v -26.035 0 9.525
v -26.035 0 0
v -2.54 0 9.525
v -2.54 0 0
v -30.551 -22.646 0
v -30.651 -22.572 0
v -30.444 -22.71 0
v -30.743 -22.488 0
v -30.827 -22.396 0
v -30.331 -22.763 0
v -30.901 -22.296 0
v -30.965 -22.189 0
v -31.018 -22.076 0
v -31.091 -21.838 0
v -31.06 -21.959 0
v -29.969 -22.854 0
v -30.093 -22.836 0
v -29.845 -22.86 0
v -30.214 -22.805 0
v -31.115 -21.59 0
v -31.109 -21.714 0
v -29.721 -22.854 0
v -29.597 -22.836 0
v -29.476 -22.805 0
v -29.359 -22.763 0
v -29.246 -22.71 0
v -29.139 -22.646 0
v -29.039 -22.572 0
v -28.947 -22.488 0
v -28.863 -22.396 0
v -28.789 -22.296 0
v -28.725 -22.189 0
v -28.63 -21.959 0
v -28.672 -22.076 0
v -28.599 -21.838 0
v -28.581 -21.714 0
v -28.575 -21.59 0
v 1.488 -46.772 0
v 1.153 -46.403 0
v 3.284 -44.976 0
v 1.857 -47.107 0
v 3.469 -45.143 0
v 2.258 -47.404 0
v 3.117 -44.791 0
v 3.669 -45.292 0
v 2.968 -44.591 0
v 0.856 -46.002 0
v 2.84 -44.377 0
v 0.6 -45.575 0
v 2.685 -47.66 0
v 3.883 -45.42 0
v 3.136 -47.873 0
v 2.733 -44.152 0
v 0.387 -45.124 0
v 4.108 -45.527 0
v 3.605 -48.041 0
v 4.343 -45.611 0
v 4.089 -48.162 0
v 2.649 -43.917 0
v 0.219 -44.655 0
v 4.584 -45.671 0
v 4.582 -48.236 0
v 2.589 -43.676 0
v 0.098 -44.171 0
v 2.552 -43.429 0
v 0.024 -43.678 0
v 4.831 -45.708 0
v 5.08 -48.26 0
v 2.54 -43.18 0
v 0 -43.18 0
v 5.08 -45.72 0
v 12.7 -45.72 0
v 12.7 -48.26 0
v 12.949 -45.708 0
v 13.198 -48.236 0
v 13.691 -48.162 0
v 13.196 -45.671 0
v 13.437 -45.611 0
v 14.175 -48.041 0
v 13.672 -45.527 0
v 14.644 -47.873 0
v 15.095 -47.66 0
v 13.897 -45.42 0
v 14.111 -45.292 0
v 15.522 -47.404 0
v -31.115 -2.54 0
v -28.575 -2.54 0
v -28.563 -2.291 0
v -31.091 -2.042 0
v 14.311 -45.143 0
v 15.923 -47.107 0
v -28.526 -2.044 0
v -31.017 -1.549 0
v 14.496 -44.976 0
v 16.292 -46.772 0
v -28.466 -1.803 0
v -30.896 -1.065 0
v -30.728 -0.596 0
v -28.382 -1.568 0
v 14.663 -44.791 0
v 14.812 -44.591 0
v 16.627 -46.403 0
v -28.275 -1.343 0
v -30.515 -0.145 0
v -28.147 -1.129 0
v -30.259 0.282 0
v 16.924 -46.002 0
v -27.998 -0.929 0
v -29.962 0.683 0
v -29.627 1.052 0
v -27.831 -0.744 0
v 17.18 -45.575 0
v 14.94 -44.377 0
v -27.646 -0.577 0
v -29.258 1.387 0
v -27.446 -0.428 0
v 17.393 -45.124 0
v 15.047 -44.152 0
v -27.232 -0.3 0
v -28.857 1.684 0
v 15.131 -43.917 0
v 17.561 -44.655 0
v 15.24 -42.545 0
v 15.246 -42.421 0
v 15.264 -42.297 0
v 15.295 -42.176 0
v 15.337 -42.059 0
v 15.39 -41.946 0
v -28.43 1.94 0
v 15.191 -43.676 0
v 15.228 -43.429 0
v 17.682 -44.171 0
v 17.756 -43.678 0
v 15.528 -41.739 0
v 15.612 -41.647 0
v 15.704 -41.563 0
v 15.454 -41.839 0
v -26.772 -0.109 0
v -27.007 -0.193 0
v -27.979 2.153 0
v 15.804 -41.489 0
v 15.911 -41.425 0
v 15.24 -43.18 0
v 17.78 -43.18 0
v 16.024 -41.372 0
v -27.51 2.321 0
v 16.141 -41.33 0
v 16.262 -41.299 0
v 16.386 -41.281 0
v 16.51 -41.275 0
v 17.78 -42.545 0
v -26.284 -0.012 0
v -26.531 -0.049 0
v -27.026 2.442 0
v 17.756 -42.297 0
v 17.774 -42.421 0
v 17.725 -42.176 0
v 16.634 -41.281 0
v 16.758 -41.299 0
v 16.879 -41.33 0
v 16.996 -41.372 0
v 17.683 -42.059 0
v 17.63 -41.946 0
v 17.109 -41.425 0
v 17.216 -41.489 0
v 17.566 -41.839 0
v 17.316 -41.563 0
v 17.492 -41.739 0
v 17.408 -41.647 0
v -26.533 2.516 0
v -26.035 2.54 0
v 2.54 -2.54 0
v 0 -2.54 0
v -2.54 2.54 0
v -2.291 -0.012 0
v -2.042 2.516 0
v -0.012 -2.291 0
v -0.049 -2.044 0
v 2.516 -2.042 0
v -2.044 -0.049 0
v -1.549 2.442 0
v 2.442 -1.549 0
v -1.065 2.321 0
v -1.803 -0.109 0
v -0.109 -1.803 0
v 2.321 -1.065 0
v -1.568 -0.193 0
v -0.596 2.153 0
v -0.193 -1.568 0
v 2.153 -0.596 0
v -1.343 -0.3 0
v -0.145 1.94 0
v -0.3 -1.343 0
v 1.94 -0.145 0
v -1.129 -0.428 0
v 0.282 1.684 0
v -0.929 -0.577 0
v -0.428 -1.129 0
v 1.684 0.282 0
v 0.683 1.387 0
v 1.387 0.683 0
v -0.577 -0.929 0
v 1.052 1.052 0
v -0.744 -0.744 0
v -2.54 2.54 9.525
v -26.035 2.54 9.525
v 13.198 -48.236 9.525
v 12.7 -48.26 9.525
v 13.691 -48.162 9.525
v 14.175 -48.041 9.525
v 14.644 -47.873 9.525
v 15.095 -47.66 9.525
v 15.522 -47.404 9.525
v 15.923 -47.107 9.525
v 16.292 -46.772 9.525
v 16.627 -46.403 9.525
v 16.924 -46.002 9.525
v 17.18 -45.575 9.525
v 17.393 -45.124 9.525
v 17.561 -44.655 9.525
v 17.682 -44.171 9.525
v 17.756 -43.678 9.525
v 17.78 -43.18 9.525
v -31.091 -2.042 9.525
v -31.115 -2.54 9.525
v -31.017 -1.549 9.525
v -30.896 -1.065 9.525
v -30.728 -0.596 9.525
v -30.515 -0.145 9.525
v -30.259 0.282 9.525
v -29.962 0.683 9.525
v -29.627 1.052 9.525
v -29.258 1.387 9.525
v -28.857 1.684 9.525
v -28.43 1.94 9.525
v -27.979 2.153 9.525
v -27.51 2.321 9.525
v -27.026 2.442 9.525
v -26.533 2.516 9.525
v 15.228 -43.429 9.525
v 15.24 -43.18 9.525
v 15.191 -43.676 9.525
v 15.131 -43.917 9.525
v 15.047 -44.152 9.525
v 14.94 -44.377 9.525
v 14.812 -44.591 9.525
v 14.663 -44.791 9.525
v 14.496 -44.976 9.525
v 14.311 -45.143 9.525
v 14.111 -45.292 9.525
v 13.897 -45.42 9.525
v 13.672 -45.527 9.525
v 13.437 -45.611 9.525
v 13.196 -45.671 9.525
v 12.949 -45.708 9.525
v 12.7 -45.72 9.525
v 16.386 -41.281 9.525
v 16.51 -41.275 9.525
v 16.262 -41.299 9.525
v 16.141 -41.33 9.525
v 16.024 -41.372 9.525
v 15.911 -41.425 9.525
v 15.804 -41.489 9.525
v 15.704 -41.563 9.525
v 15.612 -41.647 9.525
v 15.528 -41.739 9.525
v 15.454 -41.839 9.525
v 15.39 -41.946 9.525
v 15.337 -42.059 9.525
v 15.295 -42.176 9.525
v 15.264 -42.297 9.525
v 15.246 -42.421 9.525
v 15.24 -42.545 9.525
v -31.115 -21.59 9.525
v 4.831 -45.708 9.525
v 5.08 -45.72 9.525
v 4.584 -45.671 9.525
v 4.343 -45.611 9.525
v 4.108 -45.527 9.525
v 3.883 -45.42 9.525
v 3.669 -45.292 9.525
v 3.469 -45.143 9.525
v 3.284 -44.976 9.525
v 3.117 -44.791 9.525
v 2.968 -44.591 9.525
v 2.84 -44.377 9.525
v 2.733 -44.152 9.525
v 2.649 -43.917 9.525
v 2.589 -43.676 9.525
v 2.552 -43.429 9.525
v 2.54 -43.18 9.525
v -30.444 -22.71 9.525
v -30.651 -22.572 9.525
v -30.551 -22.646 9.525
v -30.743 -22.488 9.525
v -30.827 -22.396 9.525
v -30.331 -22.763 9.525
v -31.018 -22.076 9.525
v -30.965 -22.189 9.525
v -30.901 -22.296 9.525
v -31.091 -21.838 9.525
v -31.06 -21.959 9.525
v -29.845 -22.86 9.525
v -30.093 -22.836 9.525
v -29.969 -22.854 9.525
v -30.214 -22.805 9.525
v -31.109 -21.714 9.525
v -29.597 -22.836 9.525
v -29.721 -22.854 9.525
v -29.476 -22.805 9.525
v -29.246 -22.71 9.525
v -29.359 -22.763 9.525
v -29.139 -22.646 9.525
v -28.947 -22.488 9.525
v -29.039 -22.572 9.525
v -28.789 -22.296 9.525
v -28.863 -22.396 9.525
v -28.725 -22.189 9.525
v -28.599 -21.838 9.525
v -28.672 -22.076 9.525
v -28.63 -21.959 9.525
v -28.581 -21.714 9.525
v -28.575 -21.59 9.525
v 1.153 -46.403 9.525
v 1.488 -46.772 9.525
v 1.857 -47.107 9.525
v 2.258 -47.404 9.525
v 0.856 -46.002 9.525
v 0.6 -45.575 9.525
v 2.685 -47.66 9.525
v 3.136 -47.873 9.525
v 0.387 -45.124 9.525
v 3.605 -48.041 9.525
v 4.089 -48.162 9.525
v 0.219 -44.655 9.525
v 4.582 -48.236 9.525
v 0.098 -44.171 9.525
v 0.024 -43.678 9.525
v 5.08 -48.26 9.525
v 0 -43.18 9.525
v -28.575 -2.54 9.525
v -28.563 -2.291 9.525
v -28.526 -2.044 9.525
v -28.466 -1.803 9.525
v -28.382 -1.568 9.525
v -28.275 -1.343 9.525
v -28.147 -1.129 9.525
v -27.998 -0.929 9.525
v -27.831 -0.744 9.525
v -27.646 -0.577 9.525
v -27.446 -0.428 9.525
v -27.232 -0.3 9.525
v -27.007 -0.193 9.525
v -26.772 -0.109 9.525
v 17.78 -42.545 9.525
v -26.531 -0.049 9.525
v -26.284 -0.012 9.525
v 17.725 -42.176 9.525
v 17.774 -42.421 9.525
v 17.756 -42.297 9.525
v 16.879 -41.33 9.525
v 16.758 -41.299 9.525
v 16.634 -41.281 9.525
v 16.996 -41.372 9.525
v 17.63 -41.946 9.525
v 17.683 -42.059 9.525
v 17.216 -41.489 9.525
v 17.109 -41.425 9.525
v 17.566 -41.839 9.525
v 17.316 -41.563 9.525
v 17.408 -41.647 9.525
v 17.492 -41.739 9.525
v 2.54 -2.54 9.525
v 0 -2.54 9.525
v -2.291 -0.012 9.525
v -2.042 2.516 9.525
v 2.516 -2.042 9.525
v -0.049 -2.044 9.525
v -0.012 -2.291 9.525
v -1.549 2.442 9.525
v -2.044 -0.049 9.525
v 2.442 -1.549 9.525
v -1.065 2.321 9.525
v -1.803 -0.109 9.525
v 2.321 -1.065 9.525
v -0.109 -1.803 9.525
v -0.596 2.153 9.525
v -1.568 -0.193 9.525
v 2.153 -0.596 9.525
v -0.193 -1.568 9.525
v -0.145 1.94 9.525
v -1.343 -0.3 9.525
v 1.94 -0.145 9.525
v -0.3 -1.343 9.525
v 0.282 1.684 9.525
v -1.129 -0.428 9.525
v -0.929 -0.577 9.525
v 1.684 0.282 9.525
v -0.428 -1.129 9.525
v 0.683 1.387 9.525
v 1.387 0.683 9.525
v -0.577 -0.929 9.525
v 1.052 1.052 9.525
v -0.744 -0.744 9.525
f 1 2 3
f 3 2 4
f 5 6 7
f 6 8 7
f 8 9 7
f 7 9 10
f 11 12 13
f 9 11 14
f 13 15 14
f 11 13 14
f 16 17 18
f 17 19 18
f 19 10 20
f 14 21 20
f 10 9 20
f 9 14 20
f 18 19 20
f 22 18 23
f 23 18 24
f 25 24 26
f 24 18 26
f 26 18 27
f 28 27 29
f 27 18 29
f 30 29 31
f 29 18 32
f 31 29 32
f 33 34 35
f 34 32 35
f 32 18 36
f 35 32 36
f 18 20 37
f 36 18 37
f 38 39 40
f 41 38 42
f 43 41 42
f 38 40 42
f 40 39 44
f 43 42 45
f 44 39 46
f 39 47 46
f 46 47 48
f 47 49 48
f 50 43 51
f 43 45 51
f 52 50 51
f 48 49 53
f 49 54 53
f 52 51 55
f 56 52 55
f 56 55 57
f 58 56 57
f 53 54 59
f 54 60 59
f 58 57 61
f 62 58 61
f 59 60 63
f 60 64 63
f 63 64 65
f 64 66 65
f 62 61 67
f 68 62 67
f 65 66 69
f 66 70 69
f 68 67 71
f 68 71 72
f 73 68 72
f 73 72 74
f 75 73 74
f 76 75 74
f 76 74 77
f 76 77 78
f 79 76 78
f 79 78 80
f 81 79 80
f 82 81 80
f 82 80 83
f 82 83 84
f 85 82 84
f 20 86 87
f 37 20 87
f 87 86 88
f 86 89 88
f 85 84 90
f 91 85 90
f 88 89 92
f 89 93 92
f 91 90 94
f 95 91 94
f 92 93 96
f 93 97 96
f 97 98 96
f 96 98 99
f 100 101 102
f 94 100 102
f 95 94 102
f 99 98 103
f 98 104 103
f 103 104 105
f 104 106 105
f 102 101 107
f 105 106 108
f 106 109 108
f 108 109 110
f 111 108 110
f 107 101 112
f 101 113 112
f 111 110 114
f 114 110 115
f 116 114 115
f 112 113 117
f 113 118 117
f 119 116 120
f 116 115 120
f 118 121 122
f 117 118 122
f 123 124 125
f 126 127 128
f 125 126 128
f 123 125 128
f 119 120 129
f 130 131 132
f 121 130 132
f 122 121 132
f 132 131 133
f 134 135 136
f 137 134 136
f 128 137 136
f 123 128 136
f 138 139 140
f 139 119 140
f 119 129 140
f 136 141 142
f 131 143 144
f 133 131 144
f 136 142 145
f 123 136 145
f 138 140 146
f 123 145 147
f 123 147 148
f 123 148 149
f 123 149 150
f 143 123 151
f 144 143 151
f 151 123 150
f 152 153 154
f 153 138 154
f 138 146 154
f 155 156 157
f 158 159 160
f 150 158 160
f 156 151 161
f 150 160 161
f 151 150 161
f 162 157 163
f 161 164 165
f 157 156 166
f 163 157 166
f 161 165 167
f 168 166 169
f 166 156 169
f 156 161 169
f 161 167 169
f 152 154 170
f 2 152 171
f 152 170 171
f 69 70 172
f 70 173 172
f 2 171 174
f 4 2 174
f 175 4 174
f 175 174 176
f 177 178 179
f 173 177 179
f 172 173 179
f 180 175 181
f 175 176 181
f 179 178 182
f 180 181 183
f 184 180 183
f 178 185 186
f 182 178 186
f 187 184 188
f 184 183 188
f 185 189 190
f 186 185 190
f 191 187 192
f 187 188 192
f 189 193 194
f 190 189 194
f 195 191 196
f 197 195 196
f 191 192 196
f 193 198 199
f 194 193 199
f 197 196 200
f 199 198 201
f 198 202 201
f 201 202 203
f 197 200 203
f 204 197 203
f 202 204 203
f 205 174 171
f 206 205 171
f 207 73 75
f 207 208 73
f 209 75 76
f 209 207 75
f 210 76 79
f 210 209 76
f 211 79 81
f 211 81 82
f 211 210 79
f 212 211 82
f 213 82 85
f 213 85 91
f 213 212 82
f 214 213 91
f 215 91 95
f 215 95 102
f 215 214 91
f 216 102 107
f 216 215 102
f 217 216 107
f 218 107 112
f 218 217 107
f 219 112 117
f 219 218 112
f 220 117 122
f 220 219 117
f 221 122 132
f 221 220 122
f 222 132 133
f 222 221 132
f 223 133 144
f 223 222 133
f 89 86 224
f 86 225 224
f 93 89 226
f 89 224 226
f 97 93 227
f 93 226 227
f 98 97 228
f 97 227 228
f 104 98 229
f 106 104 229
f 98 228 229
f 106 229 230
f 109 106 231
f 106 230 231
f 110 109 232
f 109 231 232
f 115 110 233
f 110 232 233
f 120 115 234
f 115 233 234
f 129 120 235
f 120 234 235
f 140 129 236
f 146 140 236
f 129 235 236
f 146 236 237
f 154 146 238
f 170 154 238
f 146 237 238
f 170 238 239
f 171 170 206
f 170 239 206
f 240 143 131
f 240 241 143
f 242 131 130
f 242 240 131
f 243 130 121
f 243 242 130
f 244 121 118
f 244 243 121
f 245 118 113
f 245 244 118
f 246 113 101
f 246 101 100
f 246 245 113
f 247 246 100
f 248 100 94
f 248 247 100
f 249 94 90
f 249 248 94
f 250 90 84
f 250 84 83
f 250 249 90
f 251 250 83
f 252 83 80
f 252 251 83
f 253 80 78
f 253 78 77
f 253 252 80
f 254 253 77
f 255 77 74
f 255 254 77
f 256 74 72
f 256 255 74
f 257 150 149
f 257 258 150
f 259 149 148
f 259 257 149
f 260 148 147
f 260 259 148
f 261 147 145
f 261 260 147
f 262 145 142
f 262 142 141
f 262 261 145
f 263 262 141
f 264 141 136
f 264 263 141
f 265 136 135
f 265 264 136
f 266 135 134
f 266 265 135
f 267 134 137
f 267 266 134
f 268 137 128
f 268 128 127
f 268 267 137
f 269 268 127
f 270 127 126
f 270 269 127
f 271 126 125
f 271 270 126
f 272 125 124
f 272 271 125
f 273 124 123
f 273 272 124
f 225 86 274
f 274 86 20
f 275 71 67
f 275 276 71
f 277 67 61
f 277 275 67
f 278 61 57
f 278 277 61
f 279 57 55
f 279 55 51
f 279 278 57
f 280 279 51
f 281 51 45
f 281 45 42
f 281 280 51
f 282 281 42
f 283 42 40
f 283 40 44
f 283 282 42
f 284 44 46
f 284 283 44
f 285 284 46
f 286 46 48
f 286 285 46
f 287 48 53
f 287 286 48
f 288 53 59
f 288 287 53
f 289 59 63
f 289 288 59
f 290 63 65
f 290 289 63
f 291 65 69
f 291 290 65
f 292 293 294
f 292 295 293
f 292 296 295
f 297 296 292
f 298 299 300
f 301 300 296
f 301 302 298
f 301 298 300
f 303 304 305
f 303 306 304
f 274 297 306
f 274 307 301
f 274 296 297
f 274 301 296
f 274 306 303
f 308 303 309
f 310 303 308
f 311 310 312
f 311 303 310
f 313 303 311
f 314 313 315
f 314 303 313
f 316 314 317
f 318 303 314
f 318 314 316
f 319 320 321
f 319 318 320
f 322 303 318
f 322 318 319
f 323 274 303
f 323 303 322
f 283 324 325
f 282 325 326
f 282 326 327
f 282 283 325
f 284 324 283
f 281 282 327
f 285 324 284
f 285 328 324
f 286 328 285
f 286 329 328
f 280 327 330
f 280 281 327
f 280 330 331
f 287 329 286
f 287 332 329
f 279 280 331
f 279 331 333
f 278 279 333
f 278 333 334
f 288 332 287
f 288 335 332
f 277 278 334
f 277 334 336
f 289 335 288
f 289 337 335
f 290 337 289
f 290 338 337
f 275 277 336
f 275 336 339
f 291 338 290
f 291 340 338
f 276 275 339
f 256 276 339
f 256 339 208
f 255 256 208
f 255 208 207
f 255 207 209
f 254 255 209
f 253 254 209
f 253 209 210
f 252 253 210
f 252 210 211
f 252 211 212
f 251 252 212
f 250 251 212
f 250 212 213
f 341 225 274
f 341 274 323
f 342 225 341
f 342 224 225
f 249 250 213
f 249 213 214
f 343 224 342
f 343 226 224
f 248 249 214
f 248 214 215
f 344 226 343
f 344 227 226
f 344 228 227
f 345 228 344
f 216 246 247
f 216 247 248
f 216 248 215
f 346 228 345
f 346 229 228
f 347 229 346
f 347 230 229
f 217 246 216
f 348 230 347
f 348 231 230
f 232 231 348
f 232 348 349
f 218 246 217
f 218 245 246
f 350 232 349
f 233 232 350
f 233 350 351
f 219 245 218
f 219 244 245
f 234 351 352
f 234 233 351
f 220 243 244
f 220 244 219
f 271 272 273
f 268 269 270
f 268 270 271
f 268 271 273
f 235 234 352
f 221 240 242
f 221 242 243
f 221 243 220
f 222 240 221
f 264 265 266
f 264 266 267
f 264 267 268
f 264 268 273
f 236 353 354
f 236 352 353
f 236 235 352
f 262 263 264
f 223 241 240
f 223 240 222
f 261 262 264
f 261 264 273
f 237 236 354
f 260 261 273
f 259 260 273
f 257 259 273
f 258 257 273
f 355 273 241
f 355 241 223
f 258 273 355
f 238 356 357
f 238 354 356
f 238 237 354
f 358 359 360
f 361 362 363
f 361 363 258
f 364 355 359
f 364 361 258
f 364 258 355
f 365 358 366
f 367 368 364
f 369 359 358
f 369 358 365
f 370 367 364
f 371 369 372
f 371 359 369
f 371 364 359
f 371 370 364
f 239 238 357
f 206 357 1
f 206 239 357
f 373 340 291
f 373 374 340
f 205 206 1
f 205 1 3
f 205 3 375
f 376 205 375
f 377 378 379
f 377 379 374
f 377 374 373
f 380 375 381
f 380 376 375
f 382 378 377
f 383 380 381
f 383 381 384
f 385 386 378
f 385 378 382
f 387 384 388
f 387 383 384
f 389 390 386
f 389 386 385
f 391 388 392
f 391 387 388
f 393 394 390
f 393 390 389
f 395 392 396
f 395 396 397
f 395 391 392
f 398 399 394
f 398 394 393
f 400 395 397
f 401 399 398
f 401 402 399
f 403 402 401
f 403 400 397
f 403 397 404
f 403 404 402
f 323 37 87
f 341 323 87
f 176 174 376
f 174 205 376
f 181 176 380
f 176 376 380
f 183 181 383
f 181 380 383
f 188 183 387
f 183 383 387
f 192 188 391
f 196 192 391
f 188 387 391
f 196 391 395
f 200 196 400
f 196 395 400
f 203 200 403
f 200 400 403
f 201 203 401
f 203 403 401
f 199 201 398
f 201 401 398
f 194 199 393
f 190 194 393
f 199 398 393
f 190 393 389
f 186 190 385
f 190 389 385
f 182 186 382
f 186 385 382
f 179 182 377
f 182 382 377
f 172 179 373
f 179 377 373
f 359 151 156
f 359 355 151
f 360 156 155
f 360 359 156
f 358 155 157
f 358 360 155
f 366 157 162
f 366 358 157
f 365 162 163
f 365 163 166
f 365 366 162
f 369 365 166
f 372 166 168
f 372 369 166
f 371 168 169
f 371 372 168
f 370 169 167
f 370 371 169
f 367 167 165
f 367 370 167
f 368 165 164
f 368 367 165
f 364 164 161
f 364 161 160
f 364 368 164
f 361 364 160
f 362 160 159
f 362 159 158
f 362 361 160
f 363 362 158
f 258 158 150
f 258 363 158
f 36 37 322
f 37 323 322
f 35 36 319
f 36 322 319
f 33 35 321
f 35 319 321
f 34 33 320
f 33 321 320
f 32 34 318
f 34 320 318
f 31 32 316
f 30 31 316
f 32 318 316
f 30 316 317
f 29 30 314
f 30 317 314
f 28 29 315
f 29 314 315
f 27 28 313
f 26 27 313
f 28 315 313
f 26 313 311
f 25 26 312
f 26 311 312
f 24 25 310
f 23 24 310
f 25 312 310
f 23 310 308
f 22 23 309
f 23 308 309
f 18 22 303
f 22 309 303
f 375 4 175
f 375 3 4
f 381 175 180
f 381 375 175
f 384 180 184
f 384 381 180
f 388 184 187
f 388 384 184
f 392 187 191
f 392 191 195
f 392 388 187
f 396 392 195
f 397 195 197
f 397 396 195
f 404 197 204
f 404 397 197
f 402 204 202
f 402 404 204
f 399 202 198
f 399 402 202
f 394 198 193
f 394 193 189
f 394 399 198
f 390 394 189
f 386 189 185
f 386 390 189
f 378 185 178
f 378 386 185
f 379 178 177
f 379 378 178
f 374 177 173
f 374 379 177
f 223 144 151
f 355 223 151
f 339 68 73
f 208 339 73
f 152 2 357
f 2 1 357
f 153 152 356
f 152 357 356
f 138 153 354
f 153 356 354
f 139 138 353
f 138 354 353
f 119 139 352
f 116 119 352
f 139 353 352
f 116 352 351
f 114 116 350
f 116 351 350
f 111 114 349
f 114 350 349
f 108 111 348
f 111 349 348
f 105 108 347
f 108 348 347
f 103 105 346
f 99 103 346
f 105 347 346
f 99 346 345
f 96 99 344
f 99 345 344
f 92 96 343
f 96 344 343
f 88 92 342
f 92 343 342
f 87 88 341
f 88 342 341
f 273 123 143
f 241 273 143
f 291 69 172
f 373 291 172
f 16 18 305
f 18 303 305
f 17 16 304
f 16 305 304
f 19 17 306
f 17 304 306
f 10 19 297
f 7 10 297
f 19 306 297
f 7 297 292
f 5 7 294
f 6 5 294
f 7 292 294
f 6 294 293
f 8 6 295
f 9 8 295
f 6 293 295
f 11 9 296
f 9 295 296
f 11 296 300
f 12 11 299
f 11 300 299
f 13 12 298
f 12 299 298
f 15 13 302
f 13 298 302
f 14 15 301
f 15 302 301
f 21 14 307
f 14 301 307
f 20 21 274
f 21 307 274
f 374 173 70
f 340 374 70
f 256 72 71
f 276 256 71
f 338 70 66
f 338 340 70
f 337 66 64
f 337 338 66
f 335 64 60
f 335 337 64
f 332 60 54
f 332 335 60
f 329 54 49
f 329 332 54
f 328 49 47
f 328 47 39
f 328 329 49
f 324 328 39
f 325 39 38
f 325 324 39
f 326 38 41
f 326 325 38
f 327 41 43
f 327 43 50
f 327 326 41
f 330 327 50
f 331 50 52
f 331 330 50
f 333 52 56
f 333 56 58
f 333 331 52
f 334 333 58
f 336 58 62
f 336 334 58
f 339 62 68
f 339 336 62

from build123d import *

# Parameters (mm, degrees)
F1_DEPTH = 9.525
F2_R     = 2.54
F3_R     = 5.08
F4_R     = 1.26999


# Not quite as in the source:
# - a fillet or chamfer is up to 0.001 mm smaller than in the source, because OpenCascade refuses the exact size


with BuildPart() as f1:
    # F0 (on Top) → F1 (new body)
    with BuildSketch(Plane.XY):
        Polygon((-28.575, 0), (0, 0), (0, -48.26), (17.78, -48.26), (17.78, -41.275), (15.24, -41.275), (15.24, -45.72), (2.54, -45.72), (2.54, 2.54), (-31.115, 2.54), (-31.115, -22.86), (-28.575, -22.86), align=None)
    extrude(amount=F1_DEPTH)

    # F2
    f2_edges = [f1.edges().sort_by_distance(p)[0] for p in [
        (15.24, -45.72, 4.7625),
        (2.54, -45.72, 4.7625),
        (-28.575, 0, 4.7625),
        (0, 0, 4.7625),
    ]]
    fillet(f2_edges, radius=F2_R)

    # F3
    f3_edges = [f1.edges().sort_by_distance(p)[0] for p in [
        (17.78, -48.26, 4.7625),
        (0, -48.26, 4.7625),
        (2.54, 2.54, 4.7625),
        (-31.115, 2.54, 4.7625),
    ]]
    fillet(f3_edges, radius=F3_R)

    # F4 (radius 1.27 in the source; OpenCascade refuses exactly that, so slightly less here)
    f4_edges = [f1.edges().sort_by_distance(p)[0] for p in [
        (-31.115, -22.86, 4.7625),
        (-28.575, -22.86, 4.7625),
        (15.24, -41.275, 4.7625),
        (17.78, -41.275, 4.7625),
    ]]
    fillet(f4_edges, radius=F4_R)


solid = f1.part
